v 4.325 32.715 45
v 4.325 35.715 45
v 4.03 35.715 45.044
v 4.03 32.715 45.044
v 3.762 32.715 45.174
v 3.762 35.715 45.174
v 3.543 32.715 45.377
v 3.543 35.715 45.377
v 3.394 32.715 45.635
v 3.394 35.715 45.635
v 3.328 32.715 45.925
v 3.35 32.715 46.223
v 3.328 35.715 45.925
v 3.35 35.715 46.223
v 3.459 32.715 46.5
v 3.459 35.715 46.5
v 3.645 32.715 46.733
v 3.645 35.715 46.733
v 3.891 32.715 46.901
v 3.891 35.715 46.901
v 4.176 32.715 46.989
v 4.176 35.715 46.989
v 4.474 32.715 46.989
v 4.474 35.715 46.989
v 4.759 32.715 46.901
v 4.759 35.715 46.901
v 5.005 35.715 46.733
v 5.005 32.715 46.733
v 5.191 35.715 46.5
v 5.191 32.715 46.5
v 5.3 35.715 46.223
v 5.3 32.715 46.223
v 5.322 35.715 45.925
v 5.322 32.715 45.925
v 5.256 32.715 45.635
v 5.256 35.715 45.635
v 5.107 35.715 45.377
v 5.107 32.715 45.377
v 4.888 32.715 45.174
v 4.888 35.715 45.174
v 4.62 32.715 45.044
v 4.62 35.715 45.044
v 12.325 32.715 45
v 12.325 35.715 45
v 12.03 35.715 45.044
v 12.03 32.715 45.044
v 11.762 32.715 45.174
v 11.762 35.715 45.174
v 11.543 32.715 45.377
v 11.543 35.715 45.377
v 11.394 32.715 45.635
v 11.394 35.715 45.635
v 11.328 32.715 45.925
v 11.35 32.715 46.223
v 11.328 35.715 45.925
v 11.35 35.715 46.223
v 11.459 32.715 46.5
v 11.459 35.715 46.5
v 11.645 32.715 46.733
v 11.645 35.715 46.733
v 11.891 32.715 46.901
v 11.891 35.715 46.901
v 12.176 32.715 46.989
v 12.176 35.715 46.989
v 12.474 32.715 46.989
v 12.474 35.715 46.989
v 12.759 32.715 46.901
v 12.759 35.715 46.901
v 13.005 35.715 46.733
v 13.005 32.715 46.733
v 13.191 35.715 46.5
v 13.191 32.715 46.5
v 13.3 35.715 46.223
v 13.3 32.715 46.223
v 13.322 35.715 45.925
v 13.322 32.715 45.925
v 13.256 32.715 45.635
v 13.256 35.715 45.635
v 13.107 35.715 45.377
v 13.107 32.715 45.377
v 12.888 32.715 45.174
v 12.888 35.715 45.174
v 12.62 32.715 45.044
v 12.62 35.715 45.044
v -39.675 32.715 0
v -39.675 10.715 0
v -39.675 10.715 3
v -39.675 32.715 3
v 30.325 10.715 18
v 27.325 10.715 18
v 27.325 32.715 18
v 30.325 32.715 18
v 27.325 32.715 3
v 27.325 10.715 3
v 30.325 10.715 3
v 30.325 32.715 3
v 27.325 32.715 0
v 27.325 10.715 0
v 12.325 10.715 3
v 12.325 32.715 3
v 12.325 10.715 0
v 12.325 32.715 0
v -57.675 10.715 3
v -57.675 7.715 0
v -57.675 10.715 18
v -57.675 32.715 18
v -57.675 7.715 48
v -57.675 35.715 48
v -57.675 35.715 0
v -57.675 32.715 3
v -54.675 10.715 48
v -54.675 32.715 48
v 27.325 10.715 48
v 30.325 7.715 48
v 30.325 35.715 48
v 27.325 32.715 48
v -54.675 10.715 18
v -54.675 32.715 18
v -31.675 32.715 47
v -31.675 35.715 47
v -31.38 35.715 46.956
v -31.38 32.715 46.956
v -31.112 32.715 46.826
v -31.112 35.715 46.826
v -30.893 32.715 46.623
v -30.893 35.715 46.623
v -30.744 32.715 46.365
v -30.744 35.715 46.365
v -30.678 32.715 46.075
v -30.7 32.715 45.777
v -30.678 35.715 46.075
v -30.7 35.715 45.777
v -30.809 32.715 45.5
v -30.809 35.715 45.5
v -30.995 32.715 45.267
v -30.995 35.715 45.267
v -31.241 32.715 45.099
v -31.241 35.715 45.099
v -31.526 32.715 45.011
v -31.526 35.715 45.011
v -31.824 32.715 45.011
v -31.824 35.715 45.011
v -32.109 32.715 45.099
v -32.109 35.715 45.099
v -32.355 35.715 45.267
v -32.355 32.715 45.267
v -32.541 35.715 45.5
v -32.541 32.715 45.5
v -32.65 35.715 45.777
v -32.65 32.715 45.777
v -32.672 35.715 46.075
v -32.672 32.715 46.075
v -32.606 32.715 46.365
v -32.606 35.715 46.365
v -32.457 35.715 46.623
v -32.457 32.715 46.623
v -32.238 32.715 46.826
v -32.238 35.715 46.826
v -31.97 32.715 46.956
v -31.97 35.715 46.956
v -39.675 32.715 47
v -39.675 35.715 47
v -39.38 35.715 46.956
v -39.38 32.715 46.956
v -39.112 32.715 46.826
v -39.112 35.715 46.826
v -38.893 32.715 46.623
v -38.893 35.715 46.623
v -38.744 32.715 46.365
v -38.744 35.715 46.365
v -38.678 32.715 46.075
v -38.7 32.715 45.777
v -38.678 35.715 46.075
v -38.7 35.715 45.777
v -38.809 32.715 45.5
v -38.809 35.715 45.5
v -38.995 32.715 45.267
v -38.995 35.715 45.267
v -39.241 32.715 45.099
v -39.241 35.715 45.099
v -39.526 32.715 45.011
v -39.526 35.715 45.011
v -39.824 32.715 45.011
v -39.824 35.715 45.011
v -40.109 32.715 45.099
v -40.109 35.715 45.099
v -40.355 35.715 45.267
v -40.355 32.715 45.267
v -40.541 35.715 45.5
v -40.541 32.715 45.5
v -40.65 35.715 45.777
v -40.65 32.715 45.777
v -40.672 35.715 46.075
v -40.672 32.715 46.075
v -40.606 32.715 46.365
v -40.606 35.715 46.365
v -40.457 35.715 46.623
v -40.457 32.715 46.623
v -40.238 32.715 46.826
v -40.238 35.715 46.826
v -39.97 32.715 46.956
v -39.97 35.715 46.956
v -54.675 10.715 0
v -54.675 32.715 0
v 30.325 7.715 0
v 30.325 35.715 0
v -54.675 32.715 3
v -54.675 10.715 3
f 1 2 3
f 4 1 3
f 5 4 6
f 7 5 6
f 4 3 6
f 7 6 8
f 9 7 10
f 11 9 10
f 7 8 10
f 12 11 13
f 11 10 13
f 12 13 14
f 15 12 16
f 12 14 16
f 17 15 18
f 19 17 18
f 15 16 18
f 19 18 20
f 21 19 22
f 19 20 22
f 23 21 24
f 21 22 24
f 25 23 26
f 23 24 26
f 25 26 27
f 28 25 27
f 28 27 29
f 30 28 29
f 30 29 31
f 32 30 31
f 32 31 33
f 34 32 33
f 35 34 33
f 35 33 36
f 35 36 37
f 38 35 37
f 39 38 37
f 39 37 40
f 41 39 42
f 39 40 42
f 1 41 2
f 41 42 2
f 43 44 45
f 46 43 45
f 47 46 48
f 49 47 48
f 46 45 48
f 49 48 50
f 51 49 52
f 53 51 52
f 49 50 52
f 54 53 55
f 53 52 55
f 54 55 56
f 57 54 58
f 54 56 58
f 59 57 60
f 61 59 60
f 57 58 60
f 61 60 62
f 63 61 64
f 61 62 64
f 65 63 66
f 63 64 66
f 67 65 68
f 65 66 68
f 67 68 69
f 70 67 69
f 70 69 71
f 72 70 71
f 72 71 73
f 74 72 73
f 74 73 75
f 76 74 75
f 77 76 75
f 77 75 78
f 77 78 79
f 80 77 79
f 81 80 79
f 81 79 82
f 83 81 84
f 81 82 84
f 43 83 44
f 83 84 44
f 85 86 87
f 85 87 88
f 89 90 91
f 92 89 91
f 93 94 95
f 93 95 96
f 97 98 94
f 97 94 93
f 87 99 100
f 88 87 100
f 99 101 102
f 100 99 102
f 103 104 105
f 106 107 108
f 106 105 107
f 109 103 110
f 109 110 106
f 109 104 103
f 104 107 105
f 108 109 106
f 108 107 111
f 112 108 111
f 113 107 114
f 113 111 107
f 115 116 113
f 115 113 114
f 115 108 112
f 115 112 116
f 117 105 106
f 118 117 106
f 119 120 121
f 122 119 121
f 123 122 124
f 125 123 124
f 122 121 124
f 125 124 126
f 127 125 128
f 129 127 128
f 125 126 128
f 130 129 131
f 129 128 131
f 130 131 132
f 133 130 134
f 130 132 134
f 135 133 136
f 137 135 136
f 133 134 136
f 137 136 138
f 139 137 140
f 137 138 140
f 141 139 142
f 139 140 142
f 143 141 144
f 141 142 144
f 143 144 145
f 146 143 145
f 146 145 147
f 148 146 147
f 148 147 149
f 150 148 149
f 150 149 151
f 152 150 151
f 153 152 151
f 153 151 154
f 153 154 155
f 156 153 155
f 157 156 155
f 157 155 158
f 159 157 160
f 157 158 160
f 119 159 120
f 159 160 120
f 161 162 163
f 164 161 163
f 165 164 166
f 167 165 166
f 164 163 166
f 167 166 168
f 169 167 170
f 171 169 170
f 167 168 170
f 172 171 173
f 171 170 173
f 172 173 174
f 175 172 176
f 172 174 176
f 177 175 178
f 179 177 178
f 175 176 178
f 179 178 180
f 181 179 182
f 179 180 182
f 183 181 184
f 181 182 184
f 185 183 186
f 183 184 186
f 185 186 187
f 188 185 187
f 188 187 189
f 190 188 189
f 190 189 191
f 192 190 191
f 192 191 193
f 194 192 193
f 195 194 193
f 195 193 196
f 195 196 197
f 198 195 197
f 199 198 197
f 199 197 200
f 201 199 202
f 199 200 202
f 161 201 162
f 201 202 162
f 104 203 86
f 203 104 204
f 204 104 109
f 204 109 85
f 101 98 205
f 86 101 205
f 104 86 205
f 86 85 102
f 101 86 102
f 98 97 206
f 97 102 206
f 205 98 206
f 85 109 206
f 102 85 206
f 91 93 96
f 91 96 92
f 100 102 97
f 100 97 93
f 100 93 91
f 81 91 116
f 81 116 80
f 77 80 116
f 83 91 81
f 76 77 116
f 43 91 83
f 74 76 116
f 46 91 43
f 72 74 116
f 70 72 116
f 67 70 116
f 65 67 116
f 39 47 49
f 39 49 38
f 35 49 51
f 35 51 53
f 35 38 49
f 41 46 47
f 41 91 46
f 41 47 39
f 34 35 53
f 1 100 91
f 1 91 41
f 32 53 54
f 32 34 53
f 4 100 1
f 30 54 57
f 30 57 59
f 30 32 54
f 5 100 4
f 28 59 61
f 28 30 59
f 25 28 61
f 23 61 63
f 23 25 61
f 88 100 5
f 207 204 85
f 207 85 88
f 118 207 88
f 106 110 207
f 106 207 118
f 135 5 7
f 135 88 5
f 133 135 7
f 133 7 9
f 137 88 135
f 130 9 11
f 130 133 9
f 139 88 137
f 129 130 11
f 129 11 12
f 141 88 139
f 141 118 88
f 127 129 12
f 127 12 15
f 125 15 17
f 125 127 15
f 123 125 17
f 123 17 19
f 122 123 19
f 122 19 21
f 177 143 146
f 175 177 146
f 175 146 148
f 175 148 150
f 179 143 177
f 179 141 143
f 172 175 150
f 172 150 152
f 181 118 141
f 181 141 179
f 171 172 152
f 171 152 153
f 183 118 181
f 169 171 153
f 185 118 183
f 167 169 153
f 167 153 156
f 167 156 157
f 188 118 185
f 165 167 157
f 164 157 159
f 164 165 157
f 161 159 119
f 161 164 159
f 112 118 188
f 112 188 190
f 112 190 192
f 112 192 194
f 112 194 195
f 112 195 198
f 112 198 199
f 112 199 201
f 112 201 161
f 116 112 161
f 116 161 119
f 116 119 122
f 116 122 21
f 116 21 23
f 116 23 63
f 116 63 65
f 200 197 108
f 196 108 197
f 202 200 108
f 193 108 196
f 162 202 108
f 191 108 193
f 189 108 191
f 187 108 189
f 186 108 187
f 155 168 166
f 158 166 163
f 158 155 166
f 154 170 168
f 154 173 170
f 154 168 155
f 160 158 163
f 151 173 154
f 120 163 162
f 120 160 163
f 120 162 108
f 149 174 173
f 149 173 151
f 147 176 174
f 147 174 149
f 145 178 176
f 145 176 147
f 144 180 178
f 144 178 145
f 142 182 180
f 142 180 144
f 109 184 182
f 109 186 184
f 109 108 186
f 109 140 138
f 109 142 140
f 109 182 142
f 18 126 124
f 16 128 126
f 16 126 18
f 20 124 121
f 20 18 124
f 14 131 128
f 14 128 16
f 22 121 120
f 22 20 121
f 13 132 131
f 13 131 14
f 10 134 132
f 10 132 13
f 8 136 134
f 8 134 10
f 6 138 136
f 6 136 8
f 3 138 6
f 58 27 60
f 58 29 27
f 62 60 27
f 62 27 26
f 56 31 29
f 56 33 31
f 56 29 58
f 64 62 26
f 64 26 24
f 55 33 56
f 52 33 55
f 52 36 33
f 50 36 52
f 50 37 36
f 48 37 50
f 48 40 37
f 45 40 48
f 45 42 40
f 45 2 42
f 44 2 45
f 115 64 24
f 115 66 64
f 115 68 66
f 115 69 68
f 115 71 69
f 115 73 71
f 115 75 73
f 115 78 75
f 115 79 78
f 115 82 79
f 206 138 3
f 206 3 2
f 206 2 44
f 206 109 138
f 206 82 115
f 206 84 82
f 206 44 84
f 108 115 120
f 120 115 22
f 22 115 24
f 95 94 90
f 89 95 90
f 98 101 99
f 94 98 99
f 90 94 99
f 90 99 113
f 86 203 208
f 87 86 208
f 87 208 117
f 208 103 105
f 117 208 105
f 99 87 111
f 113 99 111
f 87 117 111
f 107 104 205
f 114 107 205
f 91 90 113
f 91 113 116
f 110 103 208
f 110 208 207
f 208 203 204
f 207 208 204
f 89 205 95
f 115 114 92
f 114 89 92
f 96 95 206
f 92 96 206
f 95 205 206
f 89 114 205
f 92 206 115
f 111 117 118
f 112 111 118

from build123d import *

# Parameters (mm, degrees)
SKETCH_1_W          = 88
SKETCH_1_H          = 28
EXTRUDE_1_DEPTH     = 48
SHELL_1_T           = -3
SKETCH_2_R          = 1
CUT_EXTRUDE_1_DEPTH = 3
SKETCH_5_W          = 15
SKETCH_5_H          = 22
CUT_EXTRUDE_4_DEPTH = 107.412344412
SKETCH_6_W          = 15
SKETCH_6_H          = 22
CUT_EXTRUDE_5_DEPTH = 15


with BuildPart() as part:
    # 草圖1 → 填料-伸長1 (new body)
    with BuildSketch(Plane.XY):
        with Locations((-13.67483766, 21.715361446)):
            Rectangle(SKETCH_1_W, SKETCH_1_H)
    extrude(amount=EXTRUDE_1_DEPTH)

    # 薄殼1
    shell_1_openings = [part.faces().sort_by_distance(p)[0] for p in [
        (-13.67483766, 21.715361446, 48),
    ]]
    offset(amount=SHELL_1_T, openings=shell_1_openings, kind=Kind.INTERSECTION)

    # 草圖2 → 除料-伸長1 (cut)
    with BuildSketch(Plane(origin=(0, 35.715361446, 0), x_dir=(1, 0, 0), z_dir=(0, 1, 0))):
        with Locations(Location((-31.67483766, -46, 0), (0, 0, 270))):
            Circle(SKETCH_2_R)
        with Locations(Location((-39.67483766, -46, 0), (0, 0, 270))):
            Circle(SKETCH_2_R)
        with Locations(Location((12.32516234, -46, 0), (0, 0, 90))):
            Circle(SKETCH_2_R)
        with Locations(Location((4.32516234, -46, 0), (0, 0, 90))):
            Circle(SKETCH_2_R)
    extrude(amount=-CUT_EXTRUDE_1_DEPTH, mode=Mode.SUBTRACT)

    # 草圖5 → 除料-伸長4 (cut, through all)
    with BuildSketch(Plane.ZY.offset(57.67483766)):
        with Locations((10.5, 21.715361446)):
            Rectangle(SKETCH_5_W, SKETCH_5_H)
    extrude(amount=-CUT_EXTRUDE_4_DEPTH, mode=Mode.SUBTRACT)

    # 草圖6 → 除料-伸長5 (cut)
    with BuildSketch(Plane(origin=(0, 0, 0), x_dir=(-1, 0, 0), z_dir=(0, 0, -1))):
        with Locations((-19.82516234, 21.715361446)):
            Rectangle(SKETCH_6_W, SKETCH_6_H)
        with Locations((47.17483766, 21.715361446)):
            Rectangle(SKETCH_6_W, SKETCH_6_H)
    extrude(amount=-CUT_EXTRUDE_5_DEPTH, mode=Mode.SUBTRACT)


solid = part.part
